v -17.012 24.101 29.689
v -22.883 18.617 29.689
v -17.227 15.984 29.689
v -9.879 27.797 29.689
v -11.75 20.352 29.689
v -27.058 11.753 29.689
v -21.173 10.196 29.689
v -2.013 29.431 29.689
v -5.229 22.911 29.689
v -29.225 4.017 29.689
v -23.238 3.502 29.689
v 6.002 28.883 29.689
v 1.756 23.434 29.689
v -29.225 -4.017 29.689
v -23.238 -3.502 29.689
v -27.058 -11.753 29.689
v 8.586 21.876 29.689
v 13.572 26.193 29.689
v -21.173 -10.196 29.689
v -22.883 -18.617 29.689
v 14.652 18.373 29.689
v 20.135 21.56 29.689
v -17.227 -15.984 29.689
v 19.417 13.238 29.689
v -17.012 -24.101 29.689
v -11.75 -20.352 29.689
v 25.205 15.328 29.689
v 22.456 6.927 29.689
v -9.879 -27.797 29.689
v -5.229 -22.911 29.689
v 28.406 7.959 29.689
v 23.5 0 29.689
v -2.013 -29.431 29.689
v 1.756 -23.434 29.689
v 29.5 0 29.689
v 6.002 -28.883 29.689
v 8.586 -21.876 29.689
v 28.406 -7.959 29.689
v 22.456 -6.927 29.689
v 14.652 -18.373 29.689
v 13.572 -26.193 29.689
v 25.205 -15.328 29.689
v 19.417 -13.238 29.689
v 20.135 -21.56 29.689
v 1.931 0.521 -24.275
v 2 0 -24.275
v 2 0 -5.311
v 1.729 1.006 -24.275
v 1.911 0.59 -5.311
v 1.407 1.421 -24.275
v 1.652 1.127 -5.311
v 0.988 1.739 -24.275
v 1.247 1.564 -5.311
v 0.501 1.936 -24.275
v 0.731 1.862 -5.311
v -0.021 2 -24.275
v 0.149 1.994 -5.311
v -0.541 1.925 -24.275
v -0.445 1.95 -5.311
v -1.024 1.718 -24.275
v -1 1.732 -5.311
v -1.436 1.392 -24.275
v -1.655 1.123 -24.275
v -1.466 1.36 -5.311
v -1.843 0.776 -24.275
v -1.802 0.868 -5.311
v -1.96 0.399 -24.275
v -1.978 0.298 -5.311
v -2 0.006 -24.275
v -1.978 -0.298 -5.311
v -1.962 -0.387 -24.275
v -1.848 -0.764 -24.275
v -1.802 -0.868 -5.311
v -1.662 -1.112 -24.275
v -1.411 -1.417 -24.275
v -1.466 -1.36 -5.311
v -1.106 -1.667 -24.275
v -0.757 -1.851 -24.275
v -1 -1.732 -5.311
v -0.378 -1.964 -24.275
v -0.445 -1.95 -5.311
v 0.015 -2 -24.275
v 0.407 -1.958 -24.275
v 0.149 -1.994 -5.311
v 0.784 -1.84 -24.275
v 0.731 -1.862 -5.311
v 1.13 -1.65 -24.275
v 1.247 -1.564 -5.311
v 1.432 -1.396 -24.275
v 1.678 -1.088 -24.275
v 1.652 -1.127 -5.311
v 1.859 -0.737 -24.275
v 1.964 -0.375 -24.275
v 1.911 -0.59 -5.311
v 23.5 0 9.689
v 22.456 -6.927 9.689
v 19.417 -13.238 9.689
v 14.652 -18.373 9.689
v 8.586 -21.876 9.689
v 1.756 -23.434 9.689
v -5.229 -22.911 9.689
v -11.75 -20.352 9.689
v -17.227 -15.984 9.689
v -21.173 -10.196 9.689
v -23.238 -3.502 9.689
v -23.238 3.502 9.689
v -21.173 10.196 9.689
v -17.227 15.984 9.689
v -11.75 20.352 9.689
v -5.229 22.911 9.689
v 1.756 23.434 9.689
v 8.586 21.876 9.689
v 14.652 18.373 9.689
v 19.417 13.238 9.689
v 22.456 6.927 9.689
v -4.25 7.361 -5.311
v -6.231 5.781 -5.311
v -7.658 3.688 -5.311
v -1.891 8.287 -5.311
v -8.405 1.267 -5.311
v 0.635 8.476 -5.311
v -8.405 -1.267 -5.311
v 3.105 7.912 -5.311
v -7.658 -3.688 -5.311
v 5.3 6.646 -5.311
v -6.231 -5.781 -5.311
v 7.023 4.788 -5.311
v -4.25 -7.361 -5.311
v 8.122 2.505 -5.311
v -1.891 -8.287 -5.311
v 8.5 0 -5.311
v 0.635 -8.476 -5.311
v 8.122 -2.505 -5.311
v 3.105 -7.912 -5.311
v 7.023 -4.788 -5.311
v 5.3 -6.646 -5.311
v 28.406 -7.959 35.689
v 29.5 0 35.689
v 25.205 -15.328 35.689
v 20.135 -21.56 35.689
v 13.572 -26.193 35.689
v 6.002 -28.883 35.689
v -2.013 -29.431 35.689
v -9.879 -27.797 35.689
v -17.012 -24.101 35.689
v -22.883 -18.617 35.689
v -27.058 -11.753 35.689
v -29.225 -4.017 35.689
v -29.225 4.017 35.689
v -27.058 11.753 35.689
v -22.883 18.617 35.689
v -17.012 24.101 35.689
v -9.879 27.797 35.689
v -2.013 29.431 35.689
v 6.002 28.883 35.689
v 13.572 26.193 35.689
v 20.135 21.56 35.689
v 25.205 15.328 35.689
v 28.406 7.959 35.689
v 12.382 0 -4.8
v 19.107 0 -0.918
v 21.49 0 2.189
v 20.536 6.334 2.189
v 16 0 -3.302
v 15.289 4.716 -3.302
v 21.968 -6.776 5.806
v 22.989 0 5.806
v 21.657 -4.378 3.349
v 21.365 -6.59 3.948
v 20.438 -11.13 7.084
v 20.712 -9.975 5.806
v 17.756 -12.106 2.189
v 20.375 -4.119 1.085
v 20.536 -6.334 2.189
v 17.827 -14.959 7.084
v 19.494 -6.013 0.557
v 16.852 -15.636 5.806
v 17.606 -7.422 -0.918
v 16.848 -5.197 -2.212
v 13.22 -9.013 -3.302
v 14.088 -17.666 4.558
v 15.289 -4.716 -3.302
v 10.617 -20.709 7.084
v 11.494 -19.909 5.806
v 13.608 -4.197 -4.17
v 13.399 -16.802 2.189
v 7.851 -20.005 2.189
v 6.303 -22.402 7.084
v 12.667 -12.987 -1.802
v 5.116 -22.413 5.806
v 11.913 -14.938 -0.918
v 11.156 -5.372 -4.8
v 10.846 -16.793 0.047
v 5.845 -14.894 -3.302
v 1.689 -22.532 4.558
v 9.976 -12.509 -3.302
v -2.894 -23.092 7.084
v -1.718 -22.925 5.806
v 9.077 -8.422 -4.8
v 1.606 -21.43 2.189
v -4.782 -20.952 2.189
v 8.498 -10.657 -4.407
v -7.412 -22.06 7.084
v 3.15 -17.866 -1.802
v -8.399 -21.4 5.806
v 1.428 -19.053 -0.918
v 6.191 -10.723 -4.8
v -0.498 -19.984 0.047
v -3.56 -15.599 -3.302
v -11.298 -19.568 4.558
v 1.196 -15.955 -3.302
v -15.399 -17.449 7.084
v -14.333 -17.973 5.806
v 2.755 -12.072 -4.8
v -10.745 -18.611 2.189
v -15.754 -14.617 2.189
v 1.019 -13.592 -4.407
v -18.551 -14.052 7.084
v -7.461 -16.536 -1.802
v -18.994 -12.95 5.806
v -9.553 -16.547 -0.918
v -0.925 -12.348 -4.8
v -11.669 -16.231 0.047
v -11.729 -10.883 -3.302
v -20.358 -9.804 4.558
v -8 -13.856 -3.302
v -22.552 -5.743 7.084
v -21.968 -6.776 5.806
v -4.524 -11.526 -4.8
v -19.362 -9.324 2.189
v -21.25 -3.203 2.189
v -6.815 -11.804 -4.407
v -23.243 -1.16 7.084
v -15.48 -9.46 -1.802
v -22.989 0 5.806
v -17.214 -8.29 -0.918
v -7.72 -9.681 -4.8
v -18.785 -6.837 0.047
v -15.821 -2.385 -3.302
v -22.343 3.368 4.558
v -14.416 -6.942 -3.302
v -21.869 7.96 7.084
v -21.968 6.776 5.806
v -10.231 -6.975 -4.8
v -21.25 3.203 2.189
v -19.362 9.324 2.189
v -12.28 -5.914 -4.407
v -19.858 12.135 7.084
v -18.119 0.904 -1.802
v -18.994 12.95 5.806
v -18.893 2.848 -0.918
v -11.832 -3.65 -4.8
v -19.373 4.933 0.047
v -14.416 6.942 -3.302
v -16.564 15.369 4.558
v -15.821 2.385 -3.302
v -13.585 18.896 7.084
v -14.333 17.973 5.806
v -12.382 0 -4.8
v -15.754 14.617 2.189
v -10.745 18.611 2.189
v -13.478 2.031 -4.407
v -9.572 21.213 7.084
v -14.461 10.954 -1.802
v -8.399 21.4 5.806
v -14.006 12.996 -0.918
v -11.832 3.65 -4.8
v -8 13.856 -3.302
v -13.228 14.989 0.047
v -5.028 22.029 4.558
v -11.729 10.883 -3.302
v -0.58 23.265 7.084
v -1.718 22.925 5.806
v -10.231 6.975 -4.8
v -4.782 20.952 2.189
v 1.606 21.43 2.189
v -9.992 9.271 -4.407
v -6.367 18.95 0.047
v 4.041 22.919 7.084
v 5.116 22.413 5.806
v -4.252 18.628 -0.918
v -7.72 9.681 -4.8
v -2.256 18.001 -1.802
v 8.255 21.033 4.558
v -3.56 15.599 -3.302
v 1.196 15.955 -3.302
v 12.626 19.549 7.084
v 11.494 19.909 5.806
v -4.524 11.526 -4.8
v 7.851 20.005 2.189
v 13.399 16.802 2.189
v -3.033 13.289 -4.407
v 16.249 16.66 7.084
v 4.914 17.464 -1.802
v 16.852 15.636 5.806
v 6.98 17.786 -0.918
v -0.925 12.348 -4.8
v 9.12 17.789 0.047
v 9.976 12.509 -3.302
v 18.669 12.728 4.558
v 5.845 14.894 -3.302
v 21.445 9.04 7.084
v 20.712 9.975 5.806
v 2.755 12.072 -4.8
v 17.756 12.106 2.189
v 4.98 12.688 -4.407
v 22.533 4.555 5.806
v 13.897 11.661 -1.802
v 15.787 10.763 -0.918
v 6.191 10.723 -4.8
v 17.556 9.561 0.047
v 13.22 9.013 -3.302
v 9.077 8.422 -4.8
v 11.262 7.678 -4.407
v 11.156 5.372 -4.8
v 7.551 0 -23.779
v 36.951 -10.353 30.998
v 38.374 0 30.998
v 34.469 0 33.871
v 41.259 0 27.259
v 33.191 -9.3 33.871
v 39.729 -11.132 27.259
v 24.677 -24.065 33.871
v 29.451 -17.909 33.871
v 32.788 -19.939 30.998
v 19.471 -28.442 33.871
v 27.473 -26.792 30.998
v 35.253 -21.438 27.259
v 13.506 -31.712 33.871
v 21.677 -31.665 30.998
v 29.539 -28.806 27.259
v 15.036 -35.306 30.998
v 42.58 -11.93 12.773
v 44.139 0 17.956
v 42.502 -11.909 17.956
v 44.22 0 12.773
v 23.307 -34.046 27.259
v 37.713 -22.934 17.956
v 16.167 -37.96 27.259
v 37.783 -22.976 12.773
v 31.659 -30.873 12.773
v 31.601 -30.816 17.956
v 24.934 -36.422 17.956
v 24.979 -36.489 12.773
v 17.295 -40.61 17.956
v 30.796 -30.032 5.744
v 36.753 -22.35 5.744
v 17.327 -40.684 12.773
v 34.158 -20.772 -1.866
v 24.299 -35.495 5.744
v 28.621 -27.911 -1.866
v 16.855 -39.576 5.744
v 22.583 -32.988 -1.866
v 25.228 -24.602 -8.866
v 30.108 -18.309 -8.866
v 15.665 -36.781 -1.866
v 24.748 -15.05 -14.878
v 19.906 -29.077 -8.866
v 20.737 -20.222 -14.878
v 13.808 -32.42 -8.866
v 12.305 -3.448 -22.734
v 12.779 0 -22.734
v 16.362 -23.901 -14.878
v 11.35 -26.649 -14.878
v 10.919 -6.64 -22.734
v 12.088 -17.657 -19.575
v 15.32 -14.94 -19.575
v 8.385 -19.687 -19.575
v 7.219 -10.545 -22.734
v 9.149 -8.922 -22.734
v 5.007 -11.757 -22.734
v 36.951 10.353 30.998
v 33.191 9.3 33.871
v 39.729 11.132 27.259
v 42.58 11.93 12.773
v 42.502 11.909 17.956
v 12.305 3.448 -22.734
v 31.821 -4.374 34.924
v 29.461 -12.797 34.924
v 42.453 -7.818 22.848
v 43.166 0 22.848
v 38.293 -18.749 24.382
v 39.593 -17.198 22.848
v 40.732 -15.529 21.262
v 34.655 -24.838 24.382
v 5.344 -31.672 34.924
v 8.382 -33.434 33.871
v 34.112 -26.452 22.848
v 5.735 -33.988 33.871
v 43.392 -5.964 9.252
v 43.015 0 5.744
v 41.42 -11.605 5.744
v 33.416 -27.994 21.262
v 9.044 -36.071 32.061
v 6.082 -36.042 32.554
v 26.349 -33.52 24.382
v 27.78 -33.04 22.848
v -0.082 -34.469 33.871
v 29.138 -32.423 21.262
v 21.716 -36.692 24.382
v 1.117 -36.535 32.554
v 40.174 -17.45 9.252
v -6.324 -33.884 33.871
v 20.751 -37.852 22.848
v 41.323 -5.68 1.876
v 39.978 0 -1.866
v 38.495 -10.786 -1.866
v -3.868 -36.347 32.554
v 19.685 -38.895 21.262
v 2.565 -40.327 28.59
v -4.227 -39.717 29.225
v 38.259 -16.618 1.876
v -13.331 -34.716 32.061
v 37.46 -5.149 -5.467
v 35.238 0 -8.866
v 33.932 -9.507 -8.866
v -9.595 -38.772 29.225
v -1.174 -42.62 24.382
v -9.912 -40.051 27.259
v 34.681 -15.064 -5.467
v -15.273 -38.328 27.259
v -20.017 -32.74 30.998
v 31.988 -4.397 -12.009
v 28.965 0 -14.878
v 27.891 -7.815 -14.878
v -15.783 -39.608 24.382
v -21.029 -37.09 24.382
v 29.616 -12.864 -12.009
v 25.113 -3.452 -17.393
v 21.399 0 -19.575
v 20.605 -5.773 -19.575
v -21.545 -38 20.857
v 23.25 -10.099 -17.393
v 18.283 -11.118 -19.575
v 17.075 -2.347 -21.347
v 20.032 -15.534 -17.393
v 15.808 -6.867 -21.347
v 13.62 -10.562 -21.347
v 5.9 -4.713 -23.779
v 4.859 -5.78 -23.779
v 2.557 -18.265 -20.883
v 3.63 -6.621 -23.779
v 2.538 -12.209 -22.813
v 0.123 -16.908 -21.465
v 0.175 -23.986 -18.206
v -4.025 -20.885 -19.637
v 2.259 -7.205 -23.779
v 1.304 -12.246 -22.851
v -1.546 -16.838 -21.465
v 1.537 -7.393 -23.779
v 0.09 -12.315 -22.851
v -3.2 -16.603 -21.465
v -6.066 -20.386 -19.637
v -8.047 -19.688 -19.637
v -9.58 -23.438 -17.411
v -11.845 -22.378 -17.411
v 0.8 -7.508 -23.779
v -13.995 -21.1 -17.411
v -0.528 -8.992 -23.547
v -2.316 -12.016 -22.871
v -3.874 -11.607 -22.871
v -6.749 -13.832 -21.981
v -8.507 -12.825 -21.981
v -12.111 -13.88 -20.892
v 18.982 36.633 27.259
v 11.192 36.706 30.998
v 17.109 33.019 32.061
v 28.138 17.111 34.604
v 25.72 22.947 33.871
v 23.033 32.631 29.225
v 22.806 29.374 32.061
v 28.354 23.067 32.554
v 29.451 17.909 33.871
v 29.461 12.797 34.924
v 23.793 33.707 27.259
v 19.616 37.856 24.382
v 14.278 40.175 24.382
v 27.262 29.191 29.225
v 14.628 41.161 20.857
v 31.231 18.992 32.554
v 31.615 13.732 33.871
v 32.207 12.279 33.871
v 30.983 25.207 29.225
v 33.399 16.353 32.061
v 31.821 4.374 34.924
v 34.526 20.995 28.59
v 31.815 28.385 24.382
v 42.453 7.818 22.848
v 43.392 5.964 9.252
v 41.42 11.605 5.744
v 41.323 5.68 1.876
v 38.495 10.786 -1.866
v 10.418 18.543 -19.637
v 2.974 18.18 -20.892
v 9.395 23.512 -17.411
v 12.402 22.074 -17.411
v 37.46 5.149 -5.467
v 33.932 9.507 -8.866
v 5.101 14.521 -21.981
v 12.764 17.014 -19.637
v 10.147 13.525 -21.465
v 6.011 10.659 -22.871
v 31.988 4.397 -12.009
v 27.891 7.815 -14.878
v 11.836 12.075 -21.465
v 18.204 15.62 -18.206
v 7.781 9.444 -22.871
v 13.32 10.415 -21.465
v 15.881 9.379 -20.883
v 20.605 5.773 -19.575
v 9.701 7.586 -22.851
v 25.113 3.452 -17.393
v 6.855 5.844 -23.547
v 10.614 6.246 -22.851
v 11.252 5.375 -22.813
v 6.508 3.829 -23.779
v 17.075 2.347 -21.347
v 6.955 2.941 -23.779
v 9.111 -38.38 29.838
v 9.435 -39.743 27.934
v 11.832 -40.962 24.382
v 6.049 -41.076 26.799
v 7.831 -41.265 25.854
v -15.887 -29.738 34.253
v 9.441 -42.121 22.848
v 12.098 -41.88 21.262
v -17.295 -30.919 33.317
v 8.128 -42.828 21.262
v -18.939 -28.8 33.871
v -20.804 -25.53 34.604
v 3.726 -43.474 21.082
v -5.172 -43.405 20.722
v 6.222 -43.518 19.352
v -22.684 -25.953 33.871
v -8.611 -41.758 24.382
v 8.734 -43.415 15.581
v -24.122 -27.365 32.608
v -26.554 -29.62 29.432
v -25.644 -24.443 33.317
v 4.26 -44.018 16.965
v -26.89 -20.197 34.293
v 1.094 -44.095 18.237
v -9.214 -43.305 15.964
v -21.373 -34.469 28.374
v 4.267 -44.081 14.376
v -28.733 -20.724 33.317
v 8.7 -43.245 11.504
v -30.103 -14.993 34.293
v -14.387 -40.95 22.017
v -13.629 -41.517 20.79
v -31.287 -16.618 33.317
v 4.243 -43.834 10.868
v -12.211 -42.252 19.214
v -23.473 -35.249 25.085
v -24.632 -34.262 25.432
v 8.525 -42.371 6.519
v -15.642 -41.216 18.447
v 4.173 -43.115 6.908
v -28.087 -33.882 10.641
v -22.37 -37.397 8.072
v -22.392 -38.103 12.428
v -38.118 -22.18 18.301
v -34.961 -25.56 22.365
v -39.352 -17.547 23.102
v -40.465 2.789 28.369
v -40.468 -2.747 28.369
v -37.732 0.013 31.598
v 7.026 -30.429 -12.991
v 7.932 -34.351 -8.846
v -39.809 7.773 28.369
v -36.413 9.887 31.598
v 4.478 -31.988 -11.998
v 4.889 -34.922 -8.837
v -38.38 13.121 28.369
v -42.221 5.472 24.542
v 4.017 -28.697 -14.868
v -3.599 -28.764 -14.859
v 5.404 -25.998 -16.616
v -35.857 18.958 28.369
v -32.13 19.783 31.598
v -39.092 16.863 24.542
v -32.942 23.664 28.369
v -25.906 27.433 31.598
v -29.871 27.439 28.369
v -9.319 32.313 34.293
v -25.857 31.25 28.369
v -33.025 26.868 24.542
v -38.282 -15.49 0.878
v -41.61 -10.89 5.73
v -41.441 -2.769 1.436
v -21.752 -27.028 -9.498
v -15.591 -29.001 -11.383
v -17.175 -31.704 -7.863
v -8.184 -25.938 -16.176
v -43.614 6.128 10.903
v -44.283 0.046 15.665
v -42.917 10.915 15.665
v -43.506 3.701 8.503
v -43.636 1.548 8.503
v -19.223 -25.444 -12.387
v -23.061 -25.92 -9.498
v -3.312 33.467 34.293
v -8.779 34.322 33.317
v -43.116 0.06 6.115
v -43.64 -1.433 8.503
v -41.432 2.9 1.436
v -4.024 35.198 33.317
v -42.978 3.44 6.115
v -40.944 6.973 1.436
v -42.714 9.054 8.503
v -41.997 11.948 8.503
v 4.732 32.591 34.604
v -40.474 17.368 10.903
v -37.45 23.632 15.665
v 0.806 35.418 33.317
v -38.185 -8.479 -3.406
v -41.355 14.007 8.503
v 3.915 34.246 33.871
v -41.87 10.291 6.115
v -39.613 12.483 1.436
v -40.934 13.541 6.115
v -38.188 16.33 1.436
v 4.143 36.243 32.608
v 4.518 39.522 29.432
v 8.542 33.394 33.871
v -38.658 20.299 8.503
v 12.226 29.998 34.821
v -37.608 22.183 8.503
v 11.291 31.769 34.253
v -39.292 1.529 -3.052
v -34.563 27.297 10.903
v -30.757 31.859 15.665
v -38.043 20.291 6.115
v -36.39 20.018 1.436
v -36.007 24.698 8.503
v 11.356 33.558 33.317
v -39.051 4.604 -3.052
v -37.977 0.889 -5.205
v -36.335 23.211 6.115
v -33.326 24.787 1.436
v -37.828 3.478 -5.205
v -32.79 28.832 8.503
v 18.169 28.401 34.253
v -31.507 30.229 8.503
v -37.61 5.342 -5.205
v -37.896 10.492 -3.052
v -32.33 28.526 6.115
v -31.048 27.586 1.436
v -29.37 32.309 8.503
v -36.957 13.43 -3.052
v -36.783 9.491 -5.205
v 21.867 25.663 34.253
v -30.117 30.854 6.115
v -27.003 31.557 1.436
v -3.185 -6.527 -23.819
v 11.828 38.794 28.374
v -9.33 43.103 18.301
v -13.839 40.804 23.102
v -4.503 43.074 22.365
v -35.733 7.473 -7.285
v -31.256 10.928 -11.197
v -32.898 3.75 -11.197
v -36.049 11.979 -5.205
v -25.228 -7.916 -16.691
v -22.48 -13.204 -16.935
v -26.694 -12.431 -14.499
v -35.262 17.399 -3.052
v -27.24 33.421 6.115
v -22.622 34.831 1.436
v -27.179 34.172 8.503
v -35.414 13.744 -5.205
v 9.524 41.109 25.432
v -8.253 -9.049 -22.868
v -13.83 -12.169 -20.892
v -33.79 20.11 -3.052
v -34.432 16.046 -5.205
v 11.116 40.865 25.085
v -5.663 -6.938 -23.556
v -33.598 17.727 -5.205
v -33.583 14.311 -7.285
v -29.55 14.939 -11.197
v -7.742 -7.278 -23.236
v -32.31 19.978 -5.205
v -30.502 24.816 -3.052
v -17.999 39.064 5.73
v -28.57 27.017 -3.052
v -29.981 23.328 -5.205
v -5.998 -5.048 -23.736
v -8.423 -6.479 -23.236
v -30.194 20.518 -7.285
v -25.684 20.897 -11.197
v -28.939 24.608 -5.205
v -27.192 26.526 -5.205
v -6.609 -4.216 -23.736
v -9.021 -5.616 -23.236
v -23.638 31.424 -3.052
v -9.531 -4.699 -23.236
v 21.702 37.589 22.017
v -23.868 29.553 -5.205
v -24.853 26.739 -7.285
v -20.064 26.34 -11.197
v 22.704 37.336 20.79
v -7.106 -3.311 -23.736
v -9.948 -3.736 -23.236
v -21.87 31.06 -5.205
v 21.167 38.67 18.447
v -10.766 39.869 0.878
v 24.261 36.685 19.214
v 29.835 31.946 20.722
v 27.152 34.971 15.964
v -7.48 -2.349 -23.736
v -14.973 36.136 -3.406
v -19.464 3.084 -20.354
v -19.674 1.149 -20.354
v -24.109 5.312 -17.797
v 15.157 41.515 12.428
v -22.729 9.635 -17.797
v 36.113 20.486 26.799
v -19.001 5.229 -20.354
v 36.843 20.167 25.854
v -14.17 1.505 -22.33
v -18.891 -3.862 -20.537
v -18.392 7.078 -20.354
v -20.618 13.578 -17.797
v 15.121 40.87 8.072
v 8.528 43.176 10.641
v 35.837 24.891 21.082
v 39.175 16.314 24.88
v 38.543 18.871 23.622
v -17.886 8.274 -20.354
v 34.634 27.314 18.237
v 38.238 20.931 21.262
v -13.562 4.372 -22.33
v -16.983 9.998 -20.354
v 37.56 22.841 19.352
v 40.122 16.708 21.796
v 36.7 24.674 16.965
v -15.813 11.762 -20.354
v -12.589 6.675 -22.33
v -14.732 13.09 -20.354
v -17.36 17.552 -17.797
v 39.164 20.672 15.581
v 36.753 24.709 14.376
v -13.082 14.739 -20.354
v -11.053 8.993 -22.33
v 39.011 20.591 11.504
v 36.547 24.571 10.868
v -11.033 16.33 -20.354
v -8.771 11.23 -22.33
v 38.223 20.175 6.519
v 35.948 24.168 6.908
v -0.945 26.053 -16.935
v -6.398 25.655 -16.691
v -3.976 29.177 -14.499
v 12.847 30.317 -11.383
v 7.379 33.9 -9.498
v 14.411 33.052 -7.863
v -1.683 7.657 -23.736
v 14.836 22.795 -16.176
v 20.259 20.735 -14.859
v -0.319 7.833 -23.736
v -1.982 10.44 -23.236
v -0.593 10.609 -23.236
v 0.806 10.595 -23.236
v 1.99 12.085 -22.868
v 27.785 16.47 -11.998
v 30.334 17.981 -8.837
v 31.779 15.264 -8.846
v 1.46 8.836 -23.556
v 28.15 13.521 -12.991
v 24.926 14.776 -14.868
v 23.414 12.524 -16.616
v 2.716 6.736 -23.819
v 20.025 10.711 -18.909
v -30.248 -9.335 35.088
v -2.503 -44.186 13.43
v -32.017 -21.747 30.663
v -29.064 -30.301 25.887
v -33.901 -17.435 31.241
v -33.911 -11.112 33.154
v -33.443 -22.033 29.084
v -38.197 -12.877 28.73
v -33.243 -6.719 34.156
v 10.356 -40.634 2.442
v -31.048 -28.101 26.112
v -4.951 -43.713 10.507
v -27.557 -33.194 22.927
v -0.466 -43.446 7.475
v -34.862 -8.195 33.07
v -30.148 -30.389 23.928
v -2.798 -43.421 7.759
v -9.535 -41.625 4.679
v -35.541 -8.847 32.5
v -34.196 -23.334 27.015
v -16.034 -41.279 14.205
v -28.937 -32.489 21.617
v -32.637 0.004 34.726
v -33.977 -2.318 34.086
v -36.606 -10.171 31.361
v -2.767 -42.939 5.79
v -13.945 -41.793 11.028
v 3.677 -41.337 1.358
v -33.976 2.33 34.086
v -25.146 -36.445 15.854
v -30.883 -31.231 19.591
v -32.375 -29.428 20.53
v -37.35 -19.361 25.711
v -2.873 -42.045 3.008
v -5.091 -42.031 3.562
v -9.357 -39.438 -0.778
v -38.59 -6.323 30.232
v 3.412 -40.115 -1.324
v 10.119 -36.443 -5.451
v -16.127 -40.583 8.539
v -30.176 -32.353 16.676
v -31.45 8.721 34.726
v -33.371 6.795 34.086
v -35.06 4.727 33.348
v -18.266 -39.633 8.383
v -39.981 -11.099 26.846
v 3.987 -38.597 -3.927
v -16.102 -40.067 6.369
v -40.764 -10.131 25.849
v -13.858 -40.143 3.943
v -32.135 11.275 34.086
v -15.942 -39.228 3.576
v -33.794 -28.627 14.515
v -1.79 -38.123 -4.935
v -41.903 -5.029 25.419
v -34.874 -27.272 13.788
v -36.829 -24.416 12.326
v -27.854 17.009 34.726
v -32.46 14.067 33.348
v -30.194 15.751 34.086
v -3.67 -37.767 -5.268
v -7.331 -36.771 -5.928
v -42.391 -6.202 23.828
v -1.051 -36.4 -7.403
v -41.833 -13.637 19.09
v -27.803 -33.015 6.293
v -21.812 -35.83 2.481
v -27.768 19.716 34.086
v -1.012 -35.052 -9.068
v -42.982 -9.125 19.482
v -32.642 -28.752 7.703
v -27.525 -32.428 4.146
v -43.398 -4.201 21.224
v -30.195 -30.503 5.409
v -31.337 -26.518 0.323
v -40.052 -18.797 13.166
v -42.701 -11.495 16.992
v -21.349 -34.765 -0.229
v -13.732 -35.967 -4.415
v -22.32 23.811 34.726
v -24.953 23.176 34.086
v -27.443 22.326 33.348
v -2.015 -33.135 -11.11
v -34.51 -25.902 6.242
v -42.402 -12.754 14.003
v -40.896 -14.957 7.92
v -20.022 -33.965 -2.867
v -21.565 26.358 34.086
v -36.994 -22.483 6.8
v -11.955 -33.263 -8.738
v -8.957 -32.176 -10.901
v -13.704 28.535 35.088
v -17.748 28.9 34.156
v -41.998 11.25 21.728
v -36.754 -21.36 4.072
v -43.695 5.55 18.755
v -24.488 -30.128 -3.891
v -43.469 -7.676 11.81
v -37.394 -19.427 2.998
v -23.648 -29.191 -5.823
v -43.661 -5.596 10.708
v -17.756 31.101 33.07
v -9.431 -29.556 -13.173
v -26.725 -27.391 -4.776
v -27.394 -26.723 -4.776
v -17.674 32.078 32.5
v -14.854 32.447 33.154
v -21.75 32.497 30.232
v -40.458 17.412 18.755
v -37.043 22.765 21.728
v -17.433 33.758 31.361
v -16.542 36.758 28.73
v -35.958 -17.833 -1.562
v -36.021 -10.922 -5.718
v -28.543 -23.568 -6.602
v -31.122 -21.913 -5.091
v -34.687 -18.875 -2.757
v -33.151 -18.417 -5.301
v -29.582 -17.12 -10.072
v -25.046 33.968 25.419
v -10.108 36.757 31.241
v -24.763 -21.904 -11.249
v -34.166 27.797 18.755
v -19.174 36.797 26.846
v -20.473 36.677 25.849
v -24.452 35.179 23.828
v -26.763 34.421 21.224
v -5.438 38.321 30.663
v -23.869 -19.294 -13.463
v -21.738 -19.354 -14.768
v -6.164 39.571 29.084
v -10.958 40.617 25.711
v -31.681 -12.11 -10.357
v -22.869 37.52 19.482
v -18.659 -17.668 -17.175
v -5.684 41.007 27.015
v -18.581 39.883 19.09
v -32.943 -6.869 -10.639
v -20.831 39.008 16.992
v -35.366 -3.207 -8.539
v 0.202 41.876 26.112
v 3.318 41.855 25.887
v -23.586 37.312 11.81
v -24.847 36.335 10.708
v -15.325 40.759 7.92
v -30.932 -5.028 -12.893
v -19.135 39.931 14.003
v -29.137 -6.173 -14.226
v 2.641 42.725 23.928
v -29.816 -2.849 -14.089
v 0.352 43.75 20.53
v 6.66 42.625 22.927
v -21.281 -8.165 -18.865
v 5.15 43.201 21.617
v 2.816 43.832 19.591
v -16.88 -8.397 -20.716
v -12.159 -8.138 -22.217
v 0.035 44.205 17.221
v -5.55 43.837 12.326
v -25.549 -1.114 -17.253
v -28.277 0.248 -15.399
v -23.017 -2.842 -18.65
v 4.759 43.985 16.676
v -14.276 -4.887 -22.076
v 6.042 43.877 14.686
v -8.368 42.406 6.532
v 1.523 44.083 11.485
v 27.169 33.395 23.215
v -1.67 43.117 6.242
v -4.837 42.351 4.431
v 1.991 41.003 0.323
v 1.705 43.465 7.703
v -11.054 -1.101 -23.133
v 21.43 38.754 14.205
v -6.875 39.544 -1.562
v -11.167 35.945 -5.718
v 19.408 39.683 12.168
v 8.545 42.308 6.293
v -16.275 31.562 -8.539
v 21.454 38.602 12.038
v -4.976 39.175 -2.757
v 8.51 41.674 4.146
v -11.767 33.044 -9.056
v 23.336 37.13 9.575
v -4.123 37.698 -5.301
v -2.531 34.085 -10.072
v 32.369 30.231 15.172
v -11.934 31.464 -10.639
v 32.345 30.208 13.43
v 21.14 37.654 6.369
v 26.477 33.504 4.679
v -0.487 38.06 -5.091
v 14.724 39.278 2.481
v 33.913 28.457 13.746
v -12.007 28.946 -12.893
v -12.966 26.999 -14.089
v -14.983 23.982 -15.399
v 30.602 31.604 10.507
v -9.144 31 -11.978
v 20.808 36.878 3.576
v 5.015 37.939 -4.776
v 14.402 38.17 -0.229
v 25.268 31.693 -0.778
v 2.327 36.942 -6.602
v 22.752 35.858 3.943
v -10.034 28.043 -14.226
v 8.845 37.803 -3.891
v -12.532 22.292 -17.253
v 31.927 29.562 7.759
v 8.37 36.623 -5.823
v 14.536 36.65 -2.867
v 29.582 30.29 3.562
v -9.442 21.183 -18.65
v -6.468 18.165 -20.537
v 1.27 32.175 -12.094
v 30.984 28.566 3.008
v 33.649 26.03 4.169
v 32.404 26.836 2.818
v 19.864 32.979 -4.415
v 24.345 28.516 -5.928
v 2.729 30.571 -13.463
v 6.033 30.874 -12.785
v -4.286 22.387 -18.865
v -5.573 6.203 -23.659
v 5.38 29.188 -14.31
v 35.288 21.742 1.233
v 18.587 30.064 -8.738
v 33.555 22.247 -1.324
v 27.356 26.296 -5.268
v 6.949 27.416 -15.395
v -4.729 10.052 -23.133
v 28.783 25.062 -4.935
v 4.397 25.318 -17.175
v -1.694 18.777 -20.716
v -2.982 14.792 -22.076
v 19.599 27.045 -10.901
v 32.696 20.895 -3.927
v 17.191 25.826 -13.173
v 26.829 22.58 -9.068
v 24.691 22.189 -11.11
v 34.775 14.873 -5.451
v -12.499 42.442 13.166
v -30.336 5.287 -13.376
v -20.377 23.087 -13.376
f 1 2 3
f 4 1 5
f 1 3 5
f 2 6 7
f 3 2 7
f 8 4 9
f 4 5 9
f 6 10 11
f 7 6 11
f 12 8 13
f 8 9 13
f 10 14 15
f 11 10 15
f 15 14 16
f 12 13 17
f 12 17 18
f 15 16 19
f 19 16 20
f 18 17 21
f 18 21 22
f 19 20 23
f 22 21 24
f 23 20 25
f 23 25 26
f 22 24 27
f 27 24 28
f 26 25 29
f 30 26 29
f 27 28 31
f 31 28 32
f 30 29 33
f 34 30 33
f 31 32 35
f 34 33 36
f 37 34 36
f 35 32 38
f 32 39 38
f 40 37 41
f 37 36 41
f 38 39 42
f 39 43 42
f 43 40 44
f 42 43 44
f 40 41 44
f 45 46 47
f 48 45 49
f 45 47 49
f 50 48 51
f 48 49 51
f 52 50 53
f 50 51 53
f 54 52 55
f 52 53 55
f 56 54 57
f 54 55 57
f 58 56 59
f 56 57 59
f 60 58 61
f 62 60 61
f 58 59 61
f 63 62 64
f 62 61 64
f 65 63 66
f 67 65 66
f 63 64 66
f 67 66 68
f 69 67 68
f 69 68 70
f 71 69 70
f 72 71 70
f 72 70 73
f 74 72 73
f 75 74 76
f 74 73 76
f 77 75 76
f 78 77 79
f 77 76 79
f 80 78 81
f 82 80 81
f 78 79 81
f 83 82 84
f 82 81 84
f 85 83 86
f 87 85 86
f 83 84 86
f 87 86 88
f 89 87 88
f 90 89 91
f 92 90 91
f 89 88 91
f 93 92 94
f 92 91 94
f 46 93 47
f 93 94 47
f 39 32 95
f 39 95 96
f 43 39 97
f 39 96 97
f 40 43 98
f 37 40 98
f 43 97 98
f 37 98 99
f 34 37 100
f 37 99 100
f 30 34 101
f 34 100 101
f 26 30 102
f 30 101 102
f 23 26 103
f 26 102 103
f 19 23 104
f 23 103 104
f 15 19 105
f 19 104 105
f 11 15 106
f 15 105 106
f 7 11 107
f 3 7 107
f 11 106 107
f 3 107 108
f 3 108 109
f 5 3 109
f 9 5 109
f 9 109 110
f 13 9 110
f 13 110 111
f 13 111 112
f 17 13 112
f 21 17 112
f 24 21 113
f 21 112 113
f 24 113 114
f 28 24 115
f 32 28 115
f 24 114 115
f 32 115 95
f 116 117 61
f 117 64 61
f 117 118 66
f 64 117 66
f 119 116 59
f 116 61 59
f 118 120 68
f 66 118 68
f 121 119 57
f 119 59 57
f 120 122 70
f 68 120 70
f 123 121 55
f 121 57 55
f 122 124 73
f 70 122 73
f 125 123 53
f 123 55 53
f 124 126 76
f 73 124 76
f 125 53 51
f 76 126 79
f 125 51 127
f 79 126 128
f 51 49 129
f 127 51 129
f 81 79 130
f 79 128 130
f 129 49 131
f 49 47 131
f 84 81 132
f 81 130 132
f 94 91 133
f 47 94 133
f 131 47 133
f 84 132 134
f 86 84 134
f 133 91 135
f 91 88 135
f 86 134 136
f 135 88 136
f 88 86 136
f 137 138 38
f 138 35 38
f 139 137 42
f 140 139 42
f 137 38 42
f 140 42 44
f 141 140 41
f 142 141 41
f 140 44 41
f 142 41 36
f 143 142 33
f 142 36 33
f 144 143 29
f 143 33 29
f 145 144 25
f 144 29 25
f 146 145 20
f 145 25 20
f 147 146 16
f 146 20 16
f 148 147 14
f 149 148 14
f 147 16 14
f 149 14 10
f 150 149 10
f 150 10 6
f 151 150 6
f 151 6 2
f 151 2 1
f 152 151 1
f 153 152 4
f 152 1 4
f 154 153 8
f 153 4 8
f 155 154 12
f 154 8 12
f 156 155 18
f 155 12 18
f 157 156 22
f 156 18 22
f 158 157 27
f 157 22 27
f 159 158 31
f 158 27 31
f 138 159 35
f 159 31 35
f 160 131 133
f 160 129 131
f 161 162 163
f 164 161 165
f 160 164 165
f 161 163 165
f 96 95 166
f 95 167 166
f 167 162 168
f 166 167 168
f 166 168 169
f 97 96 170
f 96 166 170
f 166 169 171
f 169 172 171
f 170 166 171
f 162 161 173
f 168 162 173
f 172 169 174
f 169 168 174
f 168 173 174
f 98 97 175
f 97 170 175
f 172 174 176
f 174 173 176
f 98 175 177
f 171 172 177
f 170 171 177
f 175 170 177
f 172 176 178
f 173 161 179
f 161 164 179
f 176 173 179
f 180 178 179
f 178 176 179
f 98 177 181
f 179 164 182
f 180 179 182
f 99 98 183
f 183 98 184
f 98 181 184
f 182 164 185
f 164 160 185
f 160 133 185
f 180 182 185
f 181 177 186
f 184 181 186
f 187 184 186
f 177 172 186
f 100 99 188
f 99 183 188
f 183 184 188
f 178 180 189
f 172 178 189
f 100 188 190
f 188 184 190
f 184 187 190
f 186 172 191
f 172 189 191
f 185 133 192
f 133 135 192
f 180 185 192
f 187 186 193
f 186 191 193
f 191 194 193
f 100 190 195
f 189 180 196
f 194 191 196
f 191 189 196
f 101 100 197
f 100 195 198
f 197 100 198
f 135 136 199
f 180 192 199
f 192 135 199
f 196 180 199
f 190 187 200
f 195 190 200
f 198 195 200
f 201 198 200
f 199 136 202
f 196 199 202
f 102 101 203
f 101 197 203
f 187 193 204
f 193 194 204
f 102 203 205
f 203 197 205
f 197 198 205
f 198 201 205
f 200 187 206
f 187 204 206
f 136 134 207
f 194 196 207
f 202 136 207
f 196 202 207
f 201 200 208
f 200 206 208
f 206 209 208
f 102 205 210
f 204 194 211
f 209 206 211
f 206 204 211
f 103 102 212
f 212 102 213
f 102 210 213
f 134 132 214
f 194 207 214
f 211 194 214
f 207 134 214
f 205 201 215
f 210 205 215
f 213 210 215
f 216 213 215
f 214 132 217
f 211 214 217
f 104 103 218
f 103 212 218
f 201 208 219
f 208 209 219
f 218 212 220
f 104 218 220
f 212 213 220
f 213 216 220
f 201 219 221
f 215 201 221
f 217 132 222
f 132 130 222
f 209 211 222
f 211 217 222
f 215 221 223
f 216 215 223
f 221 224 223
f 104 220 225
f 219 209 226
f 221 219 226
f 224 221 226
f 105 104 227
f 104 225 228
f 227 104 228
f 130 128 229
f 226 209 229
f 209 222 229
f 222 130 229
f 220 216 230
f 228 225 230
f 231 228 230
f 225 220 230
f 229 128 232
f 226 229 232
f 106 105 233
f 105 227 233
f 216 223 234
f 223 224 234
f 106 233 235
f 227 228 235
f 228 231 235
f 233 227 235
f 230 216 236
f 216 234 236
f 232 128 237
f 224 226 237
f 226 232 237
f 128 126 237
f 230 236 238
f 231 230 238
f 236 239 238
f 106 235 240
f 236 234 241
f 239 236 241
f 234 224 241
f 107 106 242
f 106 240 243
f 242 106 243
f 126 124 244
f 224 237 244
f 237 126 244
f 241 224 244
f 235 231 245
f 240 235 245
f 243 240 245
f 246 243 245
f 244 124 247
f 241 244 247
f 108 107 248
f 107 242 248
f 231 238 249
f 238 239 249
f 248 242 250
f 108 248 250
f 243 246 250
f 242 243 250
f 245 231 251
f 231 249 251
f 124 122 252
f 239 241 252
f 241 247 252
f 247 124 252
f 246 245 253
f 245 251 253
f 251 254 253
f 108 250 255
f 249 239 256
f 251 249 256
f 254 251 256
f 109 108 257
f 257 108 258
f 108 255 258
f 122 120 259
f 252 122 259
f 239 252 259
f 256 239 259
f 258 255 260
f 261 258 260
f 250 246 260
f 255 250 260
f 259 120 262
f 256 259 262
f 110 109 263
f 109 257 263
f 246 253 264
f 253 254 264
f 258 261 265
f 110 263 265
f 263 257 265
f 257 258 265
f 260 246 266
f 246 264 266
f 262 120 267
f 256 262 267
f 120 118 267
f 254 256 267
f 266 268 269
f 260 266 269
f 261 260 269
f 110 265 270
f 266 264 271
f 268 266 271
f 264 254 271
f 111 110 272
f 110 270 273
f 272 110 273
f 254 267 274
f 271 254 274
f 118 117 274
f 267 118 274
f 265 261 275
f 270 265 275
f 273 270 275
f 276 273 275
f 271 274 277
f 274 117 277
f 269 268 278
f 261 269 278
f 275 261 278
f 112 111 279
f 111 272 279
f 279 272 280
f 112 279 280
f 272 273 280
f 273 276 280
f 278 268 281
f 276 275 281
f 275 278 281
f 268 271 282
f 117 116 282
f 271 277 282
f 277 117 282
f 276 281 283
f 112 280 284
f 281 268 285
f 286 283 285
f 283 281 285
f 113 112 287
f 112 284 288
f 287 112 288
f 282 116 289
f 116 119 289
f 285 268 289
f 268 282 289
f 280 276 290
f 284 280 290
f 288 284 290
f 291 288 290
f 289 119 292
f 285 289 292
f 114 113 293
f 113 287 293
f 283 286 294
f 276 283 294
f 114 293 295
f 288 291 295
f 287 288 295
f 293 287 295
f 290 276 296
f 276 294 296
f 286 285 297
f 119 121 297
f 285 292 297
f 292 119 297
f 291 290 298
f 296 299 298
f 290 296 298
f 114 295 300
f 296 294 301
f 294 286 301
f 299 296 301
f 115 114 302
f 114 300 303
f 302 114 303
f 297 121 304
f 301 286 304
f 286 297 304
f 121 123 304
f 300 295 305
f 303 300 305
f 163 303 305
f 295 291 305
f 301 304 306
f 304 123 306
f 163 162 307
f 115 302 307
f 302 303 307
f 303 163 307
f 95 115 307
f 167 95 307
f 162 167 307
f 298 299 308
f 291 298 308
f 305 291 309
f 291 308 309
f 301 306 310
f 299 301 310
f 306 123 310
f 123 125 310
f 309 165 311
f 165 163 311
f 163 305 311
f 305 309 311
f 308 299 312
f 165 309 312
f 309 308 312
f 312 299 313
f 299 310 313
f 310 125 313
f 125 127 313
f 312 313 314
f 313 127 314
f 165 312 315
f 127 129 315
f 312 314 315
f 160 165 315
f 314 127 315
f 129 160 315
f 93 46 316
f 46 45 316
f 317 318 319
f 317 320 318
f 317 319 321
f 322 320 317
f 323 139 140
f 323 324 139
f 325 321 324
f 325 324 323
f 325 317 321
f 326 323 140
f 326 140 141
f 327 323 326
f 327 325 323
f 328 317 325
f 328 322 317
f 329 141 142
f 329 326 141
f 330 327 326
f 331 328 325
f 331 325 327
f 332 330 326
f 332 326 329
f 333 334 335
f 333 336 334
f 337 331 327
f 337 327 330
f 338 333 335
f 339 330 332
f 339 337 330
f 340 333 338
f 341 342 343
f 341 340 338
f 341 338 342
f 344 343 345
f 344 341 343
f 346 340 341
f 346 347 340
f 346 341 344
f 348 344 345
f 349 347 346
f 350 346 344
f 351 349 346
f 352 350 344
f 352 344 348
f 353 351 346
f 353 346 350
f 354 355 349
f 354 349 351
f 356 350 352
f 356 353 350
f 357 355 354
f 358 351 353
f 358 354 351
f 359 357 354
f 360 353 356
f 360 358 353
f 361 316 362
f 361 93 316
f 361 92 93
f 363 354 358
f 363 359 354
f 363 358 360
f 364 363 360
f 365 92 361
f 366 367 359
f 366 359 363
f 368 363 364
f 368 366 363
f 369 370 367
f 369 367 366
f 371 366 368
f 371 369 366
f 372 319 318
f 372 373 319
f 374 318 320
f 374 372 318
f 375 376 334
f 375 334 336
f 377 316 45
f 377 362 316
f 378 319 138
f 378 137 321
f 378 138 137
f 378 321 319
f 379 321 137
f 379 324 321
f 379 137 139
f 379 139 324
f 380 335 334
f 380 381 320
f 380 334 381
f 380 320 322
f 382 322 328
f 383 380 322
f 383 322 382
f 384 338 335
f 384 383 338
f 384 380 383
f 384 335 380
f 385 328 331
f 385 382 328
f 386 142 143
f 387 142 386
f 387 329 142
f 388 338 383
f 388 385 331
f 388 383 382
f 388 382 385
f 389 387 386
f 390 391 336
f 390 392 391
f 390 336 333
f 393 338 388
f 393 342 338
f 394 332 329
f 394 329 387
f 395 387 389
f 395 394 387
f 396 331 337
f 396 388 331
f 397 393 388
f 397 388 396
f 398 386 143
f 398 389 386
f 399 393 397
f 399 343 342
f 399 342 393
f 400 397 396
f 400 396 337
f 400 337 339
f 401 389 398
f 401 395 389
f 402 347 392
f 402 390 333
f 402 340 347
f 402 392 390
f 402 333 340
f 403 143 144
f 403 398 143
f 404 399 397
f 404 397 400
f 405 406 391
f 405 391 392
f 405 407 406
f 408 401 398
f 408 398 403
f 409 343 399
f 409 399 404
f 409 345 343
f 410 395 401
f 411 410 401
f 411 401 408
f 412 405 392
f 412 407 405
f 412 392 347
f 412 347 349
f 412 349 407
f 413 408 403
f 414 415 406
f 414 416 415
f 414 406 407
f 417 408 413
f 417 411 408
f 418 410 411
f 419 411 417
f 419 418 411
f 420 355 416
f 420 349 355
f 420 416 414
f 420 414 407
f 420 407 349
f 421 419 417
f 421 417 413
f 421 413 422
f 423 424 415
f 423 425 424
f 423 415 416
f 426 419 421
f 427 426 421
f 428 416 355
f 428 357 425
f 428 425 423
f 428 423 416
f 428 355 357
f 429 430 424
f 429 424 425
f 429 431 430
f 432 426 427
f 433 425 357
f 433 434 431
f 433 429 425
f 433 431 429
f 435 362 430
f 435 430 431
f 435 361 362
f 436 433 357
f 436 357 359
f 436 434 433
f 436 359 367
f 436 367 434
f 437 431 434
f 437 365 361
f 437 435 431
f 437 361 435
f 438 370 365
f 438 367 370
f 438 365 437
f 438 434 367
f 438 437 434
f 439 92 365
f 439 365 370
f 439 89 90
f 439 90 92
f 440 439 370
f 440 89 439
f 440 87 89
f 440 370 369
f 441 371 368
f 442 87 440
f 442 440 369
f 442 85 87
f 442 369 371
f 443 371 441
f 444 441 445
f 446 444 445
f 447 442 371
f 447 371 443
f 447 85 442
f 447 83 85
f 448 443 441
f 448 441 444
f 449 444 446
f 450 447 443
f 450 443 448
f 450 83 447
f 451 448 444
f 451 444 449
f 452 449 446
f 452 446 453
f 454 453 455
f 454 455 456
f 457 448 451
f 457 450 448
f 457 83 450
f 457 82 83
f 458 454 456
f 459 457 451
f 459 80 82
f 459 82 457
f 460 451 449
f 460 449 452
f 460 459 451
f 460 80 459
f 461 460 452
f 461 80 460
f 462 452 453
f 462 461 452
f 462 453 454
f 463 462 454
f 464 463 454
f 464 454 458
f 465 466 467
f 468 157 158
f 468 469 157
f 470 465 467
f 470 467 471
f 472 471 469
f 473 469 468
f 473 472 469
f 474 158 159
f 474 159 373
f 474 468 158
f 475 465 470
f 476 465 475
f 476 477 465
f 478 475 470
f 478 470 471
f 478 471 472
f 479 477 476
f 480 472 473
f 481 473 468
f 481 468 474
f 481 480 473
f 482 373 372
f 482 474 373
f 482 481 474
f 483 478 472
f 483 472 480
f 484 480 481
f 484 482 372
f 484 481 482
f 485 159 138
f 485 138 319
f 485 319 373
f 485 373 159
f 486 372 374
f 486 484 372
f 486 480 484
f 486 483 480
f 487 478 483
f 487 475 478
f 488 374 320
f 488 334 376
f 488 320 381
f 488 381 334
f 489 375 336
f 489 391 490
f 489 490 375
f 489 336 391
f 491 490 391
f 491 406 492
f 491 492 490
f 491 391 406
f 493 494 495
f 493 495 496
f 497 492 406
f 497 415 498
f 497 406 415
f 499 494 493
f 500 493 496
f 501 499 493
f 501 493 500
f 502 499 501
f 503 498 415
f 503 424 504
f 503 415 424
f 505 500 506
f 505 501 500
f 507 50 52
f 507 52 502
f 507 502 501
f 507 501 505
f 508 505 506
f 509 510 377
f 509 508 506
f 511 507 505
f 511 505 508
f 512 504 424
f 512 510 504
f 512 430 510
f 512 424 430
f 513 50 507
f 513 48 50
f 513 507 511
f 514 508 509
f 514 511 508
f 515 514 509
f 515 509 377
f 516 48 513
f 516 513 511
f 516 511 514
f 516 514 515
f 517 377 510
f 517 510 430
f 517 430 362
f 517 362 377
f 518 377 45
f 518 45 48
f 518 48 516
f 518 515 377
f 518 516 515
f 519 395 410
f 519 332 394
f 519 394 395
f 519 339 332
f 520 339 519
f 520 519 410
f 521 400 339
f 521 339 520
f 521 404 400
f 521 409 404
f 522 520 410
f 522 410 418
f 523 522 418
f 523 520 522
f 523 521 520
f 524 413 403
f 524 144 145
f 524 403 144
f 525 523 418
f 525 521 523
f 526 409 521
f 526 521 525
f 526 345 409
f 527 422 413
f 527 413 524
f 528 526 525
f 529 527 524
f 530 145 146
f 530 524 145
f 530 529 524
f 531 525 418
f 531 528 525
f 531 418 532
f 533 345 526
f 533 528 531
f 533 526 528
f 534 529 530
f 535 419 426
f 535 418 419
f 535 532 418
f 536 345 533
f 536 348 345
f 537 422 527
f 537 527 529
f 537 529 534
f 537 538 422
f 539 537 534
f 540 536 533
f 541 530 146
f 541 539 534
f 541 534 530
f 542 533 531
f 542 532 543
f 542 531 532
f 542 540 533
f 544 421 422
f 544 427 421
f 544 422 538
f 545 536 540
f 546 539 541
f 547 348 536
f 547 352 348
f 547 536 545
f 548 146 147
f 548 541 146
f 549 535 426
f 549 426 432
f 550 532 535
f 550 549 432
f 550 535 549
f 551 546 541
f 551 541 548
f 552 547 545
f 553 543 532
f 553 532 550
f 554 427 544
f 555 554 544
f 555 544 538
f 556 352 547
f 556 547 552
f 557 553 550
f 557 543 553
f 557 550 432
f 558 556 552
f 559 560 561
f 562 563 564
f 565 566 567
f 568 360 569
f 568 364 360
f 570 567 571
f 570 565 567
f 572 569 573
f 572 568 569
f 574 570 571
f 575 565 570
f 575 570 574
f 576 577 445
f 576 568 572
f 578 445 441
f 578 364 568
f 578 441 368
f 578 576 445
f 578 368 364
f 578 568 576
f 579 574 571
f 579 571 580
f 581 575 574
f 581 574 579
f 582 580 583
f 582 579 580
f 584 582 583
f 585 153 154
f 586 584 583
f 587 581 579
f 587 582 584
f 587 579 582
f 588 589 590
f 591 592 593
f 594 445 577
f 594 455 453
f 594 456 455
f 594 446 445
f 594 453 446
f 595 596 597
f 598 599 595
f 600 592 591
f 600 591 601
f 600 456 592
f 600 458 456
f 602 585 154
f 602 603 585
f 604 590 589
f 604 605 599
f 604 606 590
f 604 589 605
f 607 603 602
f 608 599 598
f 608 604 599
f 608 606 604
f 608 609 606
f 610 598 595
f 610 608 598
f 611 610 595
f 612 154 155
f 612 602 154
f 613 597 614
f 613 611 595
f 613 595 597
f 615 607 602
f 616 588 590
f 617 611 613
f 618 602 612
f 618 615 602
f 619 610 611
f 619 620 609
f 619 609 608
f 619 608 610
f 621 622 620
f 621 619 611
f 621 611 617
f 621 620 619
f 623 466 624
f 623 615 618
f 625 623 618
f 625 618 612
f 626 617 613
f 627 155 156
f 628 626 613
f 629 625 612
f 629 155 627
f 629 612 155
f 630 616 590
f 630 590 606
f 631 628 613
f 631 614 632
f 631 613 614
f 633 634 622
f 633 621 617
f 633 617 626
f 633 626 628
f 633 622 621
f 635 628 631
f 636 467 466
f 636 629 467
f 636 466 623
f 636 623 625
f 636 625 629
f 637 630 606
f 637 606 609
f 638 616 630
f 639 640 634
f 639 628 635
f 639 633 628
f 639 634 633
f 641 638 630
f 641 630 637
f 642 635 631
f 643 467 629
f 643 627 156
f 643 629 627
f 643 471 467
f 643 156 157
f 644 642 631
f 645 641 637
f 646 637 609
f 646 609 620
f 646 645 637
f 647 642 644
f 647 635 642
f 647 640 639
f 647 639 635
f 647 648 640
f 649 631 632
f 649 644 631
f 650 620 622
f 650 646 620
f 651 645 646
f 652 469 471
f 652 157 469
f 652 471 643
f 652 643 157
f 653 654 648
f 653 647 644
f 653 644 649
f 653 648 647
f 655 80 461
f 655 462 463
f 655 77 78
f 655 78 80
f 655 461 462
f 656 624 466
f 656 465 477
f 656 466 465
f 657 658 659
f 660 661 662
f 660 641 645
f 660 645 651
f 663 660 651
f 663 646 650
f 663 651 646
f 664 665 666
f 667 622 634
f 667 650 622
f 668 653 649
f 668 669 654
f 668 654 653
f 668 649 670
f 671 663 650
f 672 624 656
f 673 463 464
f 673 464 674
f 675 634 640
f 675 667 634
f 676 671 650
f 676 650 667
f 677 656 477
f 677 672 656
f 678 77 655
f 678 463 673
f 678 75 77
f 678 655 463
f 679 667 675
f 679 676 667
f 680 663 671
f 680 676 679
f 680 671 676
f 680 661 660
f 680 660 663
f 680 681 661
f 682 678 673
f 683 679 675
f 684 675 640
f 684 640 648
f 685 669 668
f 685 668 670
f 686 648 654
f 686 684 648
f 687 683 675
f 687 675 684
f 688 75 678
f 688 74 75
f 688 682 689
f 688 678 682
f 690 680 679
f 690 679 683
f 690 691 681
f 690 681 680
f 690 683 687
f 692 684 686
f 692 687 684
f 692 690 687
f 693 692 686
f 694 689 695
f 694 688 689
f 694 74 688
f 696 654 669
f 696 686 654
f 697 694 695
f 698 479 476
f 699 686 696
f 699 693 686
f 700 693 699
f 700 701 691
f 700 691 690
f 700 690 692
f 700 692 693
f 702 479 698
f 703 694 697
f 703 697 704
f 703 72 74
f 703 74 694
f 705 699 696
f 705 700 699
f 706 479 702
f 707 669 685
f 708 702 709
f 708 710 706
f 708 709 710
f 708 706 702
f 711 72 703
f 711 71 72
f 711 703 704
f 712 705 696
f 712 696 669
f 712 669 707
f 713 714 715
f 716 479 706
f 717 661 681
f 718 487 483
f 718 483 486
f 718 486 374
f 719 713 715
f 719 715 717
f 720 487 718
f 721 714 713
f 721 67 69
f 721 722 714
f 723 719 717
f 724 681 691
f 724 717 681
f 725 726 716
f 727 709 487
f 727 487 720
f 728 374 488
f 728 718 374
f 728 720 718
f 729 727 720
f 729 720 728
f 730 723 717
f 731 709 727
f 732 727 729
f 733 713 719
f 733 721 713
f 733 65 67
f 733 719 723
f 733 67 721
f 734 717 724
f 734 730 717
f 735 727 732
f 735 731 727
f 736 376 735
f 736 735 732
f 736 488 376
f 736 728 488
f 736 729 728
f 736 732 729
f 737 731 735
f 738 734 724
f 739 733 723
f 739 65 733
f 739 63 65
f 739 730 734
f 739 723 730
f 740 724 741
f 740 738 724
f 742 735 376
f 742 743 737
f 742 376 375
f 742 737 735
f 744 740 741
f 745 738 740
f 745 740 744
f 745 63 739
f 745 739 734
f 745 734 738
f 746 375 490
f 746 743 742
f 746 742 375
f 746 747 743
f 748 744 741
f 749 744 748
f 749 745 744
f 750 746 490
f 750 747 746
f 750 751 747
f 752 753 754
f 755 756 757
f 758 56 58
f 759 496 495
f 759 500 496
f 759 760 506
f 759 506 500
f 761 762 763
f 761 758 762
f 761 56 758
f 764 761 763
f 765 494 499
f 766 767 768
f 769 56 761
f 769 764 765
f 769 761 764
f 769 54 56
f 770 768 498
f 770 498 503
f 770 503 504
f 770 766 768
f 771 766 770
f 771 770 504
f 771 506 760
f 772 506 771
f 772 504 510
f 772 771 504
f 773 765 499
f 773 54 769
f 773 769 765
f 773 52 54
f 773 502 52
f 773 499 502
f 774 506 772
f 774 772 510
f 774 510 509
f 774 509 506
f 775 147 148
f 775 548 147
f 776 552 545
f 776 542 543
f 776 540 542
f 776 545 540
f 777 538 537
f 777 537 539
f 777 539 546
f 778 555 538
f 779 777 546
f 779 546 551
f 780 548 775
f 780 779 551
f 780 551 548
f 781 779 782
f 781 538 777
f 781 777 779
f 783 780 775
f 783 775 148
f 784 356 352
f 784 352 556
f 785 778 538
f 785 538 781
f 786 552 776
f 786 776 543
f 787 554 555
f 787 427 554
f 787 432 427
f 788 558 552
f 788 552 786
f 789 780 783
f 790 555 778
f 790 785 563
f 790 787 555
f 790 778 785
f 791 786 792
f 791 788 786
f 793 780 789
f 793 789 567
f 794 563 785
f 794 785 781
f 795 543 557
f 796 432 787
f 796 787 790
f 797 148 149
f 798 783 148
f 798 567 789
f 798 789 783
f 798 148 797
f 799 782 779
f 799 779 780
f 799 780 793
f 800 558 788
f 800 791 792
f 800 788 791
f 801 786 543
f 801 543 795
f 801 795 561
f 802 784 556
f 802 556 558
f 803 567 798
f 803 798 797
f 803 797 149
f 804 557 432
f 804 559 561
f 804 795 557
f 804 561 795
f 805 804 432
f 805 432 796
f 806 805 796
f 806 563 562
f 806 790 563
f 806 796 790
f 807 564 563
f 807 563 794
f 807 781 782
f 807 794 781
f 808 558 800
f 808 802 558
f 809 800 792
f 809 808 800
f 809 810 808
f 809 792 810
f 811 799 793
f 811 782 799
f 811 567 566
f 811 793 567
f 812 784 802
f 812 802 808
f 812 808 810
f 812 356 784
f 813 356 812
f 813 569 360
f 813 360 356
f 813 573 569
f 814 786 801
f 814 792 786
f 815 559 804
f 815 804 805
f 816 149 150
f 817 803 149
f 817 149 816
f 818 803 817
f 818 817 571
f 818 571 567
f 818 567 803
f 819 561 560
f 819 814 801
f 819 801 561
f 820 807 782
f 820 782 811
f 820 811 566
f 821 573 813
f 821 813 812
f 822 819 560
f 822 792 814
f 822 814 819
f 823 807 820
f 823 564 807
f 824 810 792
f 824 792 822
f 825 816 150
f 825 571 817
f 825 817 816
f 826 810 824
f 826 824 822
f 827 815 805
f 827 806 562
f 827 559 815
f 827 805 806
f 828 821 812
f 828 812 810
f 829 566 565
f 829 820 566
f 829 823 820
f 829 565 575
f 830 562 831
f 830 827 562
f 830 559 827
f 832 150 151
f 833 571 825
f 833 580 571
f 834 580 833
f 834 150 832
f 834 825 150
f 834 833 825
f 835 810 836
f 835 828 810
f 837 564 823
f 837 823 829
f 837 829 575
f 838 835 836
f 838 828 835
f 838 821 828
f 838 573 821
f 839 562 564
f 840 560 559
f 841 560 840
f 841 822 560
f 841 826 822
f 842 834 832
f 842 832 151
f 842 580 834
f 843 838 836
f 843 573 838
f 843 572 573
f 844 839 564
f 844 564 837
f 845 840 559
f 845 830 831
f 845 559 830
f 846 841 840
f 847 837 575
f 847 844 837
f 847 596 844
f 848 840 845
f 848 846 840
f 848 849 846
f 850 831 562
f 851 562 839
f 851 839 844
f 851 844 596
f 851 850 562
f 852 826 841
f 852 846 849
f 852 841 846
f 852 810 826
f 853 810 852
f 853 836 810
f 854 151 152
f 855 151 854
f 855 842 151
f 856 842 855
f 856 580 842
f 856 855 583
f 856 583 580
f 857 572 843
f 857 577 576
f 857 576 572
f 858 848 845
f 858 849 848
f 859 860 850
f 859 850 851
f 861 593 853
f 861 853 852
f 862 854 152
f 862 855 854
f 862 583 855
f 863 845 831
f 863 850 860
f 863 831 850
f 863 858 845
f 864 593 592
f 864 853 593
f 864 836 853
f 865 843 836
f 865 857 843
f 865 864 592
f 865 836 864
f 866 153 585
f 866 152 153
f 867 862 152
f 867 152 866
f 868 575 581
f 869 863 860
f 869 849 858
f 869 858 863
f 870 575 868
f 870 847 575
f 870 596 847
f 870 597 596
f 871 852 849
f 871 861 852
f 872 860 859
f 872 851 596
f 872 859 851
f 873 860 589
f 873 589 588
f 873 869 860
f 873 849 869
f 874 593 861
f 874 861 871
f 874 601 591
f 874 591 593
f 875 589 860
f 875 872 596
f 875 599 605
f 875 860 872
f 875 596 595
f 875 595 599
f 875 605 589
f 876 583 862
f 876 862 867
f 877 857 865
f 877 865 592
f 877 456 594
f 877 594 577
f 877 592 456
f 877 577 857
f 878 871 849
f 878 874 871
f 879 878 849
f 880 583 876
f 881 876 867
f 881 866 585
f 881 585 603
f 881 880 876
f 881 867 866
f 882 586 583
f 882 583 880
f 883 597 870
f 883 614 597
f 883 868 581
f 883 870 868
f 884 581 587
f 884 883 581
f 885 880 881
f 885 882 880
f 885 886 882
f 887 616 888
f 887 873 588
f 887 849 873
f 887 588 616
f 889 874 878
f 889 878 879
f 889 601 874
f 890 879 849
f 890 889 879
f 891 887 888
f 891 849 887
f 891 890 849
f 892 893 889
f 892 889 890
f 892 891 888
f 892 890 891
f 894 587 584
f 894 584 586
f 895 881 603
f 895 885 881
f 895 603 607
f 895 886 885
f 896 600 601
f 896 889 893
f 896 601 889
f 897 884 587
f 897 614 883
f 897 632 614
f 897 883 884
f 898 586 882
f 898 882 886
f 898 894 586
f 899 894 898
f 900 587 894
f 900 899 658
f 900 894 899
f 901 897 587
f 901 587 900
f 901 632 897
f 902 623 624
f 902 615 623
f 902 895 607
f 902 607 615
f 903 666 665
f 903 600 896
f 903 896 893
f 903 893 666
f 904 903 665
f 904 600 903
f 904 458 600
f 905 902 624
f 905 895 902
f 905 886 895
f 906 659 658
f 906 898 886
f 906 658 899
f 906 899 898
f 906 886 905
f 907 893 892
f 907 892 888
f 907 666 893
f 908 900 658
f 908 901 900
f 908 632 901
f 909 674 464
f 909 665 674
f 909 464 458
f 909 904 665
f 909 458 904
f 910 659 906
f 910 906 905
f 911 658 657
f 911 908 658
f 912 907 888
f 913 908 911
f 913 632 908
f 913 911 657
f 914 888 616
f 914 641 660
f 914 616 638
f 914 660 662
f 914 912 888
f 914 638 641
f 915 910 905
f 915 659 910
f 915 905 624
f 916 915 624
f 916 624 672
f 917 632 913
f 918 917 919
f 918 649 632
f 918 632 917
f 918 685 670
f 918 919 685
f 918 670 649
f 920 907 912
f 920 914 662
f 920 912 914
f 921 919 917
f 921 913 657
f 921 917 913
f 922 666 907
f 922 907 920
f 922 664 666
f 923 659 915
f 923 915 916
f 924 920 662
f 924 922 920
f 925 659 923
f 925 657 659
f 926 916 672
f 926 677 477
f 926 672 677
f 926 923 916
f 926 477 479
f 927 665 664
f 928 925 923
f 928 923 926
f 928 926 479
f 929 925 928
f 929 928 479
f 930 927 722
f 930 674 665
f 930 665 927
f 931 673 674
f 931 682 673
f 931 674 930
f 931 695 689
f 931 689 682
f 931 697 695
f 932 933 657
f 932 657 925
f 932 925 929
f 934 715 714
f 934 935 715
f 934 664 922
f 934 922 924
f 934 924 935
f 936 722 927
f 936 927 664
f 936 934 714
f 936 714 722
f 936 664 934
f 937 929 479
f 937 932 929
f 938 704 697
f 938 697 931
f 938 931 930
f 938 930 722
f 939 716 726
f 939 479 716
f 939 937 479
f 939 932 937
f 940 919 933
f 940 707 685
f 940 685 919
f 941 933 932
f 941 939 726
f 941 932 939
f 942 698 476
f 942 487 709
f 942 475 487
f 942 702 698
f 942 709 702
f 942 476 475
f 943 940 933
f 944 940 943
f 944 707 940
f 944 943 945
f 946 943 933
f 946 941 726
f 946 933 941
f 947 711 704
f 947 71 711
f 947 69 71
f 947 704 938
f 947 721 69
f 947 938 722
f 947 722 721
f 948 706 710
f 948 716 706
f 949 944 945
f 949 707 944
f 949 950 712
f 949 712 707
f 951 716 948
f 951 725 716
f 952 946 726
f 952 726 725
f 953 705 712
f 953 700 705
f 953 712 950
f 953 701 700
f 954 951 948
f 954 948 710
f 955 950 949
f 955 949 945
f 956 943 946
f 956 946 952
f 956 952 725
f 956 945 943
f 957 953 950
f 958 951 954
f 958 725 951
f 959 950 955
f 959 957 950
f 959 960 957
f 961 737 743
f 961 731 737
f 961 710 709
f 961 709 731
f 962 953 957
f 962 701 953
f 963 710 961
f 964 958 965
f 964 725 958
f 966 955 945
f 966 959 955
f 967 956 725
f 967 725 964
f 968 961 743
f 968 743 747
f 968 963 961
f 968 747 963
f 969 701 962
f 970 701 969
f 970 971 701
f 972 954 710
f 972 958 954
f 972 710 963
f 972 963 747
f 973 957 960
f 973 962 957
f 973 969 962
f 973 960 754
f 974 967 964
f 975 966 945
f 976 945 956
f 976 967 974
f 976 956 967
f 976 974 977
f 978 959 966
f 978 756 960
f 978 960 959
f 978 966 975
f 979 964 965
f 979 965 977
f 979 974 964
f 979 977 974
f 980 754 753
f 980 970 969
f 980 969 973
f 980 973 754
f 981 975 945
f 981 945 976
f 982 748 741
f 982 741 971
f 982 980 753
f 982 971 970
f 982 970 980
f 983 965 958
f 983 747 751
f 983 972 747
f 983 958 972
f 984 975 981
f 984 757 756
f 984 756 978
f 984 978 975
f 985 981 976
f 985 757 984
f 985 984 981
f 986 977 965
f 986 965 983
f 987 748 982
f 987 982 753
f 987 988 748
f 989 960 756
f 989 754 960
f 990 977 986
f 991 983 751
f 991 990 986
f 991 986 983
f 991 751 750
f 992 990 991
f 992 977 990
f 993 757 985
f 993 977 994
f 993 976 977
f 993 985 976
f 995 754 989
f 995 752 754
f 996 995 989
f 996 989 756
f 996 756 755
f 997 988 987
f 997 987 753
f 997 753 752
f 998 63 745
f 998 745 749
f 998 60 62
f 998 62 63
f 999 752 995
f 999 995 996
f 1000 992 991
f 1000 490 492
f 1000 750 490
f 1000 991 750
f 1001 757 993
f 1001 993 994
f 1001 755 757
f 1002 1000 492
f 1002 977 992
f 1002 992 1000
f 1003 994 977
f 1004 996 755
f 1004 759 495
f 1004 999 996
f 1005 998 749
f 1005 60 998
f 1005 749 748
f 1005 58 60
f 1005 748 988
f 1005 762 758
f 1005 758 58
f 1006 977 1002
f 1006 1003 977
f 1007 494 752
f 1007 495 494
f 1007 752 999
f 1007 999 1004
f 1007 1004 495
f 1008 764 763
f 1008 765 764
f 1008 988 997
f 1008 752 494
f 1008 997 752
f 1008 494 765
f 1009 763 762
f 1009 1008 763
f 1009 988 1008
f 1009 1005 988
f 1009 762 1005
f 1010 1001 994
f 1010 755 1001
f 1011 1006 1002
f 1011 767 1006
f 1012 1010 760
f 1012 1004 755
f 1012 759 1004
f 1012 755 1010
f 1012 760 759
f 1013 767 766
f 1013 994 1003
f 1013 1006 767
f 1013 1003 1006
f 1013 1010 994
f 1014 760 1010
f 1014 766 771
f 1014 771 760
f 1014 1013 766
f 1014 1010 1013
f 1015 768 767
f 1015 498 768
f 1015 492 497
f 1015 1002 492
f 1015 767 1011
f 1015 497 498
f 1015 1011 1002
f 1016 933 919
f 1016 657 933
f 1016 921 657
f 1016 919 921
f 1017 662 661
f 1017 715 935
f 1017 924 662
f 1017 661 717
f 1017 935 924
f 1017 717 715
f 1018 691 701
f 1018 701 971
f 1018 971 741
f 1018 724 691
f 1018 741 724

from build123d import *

# Parameters (mm, degrees)
F2_R     = 2
F3_DEPTH = 24.3123587823


with BuildPart() as f1:
    # F0 (on Front) → F1 (revolve)
    with BuildSketch(Plane.XZ):
        with BuildLine():
            Line((29.5, 29.6886413177), (23.5, 29.6886413177))
            Line((23.5, 29.6886413177), (23.5, 9.6886413177))
            ThreePointArc((23.5, 9.6886413177), (19.1066017178, -0.9179604001), (8.5, -5.3113586823))
            Line((8.5, -5.3113586823), (0, -5.3113586823))
            Line((0, -5.3113586823), (0, -24.3113586823))
            add(Edge.make_bspline(
                [(29.5, 35.6886413177), (43, 32.6886413177), (51.0440050218, 0.5273848631), (22.6898039743, -24.3113586823), (0, -24.3113586823)],
                knots=[0, 0, 0, 0, 0.4420000814, 1, 1, 1, 1], degree=3))
            Line((29.5, 35.6886413177), (29.5, 29.6886413177))
        make_face()
    revolve(axis=Axis((0, 0, 8.553719148), (0, 0, -1)))

    # F2 (on Top) → F3 (cut, through all)
    with BuildSketch(Plane.XY):
        Circle(F2_R)
    extrude(amount=-F3_DEPTH, mode=Mode.SUBTRACT)


solid = f1.part
